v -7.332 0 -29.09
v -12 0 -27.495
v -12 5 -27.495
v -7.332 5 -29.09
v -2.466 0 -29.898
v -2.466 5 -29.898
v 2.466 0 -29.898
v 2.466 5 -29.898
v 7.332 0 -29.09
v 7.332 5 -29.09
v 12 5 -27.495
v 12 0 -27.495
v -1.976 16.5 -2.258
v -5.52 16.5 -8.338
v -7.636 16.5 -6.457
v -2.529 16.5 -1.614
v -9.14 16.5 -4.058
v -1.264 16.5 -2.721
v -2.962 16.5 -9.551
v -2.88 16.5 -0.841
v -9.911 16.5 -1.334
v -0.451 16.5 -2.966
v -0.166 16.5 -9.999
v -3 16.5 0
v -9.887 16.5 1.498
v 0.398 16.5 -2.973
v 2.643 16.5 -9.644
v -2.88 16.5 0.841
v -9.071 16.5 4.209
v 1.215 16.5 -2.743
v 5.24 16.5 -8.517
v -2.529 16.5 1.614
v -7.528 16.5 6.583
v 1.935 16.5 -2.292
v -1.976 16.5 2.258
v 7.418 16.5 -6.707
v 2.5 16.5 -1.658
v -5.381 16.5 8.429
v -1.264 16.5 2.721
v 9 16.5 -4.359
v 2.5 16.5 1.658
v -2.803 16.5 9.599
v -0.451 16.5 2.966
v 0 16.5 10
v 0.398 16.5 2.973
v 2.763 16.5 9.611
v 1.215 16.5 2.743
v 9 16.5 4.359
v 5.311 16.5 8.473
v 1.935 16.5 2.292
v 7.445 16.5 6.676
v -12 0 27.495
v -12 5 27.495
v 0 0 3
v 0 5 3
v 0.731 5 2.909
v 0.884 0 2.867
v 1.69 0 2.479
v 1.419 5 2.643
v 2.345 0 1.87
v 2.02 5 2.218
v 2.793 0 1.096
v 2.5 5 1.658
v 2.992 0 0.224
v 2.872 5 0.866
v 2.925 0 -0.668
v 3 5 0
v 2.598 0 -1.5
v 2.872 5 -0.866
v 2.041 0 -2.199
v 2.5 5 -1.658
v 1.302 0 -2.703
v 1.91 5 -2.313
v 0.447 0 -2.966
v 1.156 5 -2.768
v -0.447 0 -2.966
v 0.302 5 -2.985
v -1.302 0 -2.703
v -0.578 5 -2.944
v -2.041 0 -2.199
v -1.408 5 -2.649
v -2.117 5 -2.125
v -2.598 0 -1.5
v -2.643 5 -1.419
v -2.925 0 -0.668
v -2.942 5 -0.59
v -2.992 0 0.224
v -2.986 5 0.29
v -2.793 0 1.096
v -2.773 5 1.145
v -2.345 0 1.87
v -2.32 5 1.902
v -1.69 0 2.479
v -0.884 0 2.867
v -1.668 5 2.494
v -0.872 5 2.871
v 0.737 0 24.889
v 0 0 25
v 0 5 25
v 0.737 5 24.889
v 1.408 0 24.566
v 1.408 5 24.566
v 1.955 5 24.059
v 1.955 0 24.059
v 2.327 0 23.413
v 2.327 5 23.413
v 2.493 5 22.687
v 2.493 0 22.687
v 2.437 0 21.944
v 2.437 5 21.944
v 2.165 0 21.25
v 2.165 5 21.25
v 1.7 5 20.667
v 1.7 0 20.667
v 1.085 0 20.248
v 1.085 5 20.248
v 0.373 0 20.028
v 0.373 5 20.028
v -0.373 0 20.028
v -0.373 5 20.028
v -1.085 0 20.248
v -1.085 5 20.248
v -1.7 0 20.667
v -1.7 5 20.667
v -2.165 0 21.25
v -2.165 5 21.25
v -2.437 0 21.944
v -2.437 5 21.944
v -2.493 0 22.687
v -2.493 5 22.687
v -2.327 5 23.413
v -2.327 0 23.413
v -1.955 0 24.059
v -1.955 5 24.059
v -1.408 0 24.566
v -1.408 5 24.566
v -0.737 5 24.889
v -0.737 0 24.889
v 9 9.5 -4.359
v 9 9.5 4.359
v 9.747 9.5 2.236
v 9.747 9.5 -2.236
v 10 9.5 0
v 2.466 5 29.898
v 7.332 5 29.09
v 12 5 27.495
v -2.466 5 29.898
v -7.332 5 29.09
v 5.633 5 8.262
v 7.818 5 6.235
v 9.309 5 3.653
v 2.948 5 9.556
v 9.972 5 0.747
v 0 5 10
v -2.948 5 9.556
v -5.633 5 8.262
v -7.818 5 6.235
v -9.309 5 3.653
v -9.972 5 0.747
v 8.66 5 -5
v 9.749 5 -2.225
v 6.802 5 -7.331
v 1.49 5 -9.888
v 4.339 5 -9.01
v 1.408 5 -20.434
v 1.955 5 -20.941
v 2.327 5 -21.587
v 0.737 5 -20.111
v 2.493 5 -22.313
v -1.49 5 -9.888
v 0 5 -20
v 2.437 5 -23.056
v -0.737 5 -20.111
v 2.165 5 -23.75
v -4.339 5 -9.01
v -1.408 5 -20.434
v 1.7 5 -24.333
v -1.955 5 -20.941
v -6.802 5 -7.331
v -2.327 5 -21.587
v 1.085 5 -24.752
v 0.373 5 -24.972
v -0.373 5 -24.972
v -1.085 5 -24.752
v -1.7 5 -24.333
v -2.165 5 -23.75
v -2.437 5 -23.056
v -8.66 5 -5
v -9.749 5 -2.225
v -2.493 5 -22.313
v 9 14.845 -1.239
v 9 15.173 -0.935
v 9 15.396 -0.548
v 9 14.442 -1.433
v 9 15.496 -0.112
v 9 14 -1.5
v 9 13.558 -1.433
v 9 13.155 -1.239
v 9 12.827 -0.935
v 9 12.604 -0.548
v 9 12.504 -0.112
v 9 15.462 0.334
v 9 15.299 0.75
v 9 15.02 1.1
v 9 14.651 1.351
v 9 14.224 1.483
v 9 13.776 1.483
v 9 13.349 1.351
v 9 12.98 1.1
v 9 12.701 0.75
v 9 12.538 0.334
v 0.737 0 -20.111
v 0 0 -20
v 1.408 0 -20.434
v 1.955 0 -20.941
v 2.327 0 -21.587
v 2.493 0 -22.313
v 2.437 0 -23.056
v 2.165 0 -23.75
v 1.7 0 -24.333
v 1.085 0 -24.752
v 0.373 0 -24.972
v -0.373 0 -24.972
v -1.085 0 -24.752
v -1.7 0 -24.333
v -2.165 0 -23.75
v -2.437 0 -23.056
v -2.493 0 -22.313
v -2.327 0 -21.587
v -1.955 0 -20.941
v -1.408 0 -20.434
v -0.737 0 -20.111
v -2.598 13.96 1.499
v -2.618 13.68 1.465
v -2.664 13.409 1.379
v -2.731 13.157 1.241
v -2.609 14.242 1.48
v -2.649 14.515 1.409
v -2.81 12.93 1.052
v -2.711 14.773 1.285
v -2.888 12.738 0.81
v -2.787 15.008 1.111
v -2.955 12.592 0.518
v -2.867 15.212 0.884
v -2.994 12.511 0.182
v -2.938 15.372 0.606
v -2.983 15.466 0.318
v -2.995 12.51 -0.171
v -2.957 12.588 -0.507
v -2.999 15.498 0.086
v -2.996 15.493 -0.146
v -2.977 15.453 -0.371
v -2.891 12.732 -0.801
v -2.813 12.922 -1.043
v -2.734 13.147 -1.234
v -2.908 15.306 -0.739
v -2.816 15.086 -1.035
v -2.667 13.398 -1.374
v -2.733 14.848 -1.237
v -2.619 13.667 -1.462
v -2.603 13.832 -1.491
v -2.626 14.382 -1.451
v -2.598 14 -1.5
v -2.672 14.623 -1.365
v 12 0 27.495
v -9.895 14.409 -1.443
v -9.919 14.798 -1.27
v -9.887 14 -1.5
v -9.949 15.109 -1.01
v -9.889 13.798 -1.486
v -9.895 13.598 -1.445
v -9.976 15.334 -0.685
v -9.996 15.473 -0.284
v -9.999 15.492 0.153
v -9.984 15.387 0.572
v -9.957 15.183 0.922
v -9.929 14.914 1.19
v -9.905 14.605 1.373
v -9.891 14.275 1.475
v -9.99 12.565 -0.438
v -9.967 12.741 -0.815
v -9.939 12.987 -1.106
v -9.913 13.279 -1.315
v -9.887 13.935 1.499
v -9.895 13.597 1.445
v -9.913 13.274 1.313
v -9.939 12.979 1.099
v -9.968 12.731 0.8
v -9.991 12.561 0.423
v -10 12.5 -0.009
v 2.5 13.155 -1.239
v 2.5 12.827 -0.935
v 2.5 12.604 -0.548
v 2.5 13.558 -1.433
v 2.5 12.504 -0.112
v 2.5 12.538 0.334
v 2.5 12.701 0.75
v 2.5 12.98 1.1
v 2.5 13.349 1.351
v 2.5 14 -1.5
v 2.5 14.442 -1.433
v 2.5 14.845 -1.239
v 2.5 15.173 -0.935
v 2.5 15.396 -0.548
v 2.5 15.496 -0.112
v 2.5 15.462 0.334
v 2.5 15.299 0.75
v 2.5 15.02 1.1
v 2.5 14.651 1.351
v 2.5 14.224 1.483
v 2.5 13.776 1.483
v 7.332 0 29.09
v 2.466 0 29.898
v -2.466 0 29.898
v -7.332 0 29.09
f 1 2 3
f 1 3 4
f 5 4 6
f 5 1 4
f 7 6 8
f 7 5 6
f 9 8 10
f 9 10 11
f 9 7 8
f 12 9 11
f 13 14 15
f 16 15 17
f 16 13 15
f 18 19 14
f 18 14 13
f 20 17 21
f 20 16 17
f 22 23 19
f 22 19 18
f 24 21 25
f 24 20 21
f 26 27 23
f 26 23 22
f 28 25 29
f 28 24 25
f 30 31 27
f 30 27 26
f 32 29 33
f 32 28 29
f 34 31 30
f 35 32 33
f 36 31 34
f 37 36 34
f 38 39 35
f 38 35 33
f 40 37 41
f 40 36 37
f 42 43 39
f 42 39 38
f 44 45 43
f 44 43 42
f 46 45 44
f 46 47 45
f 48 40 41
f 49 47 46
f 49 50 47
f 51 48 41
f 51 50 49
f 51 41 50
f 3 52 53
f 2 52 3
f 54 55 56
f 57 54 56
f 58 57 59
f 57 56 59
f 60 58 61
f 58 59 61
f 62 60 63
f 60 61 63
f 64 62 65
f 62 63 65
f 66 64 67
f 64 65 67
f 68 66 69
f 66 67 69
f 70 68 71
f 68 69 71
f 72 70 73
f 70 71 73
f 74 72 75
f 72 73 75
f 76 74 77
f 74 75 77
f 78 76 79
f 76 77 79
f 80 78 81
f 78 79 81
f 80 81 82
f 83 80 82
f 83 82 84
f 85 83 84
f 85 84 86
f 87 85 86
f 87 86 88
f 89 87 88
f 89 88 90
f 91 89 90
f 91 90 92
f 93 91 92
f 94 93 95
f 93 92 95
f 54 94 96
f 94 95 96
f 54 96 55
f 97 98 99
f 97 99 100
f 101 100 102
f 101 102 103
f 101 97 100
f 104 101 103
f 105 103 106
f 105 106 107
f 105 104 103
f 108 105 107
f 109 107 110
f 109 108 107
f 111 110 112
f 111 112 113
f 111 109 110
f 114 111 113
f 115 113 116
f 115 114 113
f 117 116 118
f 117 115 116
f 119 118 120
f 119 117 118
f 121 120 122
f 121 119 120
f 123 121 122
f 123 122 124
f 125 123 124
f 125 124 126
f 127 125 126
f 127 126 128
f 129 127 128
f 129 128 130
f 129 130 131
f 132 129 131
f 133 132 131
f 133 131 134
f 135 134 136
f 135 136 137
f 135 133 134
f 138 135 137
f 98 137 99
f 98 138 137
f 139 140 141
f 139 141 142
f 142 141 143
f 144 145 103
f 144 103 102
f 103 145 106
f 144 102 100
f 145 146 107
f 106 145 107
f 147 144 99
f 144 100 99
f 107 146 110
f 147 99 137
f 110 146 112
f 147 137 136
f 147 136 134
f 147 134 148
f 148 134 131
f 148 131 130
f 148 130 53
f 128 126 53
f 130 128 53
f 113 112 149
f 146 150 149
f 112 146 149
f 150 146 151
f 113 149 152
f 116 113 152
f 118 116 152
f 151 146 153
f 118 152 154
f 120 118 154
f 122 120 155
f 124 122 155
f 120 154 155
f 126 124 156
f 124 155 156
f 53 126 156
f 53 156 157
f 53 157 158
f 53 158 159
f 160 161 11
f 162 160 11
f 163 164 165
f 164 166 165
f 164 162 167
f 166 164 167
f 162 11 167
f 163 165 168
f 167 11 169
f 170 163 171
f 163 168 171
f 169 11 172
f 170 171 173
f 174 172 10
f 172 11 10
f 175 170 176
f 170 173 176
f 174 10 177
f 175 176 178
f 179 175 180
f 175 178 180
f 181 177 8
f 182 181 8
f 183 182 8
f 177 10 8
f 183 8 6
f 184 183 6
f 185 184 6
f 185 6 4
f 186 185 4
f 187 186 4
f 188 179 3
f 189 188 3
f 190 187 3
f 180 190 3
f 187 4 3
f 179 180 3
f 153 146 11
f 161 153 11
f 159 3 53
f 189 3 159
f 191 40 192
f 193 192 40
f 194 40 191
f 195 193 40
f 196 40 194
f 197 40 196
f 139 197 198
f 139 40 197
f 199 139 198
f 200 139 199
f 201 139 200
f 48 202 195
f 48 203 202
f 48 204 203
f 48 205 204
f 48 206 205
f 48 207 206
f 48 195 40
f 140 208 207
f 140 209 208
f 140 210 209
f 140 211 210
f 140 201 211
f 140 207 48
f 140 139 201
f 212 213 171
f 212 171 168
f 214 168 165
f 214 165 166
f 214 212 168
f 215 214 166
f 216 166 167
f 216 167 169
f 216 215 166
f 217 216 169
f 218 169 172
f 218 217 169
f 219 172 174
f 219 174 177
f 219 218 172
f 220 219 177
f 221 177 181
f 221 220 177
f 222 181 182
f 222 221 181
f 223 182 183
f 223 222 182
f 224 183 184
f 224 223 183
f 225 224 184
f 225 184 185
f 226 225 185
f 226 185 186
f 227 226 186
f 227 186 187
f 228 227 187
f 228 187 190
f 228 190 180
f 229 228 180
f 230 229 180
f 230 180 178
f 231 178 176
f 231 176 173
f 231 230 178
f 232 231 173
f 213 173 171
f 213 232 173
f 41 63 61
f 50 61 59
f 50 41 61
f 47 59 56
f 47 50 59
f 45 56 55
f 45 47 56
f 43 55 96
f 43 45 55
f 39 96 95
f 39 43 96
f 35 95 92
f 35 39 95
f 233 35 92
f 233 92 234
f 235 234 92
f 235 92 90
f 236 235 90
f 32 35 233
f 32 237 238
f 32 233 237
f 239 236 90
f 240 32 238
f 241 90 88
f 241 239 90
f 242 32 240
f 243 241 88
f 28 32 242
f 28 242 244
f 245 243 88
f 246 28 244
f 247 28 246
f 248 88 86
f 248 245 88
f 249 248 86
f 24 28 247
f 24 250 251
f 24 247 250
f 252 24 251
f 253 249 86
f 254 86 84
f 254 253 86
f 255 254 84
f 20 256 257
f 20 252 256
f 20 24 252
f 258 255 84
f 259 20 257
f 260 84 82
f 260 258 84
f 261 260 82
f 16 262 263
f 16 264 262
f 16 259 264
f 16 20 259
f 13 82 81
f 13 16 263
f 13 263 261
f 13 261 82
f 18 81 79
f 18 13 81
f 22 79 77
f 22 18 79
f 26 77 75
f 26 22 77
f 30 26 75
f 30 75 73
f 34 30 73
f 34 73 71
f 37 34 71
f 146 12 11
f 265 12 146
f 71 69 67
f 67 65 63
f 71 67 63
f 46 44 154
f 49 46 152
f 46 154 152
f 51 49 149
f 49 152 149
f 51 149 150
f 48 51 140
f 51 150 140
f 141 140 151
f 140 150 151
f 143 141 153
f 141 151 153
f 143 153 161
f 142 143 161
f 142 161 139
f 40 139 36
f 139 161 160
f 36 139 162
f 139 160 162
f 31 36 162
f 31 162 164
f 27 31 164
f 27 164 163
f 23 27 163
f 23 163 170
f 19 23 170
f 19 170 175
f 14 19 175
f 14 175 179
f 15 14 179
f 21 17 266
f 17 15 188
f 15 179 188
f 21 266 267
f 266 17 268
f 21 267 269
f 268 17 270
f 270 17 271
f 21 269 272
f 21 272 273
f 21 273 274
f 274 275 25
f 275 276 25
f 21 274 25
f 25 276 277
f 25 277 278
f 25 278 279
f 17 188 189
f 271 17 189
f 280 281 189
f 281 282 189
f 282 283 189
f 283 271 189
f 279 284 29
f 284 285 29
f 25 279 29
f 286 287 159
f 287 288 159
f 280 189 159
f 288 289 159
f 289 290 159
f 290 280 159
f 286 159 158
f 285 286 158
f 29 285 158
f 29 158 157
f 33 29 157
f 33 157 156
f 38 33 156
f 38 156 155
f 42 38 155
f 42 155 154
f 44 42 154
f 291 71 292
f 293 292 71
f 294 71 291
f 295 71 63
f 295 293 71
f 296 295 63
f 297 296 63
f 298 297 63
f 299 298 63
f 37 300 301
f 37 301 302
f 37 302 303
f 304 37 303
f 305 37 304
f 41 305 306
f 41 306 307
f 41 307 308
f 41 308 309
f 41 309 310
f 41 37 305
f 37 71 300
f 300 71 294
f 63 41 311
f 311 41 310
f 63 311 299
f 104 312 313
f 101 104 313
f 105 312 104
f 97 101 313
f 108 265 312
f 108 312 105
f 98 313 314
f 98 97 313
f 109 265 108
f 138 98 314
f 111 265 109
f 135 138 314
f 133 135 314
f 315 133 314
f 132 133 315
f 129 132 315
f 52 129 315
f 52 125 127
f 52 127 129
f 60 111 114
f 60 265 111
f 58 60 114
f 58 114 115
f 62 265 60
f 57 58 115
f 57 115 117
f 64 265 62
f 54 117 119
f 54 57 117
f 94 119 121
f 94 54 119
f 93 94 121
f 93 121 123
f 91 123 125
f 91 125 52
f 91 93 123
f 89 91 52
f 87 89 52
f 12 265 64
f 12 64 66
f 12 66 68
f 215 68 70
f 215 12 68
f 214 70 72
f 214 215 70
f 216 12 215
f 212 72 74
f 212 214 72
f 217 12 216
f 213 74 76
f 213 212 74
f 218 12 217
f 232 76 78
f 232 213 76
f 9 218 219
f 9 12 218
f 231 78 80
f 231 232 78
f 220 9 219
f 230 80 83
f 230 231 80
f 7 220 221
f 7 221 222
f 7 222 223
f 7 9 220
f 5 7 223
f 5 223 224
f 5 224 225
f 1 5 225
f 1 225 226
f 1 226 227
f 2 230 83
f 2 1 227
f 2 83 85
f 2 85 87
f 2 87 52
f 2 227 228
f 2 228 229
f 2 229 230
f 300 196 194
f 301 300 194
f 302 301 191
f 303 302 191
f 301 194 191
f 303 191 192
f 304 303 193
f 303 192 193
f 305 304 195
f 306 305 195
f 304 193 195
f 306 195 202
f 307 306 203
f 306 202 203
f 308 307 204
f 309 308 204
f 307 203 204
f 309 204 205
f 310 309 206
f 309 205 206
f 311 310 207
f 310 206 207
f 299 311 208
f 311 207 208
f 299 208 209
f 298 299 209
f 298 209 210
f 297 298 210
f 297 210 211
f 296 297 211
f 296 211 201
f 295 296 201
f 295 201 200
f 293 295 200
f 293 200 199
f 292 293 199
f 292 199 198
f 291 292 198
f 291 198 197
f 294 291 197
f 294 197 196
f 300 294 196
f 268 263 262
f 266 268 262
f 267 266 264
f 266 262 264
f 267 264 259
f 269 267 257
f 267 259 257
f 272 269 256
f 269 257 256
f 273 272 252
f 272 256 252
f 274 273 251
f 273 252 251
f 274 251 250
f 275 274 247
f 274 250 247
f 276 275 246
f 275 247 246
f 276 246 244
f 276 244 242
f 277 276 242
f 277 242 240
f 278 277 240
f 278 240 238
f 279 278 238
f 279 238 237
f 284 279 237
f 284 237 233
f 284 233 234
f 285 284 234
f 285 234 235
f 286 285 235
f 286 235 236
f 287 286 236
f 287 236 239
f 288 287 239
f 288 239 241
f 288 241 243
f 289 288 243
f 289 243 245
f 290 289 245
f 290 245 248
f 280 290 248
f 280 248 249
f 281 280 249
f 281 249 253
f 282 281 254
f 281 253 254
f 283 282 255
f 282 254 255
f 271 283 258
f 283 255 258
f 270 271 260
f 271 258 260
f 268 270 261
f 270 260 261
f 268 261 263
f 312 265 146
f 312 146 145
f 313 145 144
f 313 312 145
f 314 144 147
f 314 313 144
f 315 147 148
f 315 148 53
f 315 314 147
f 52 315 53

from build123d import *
from build123d.topology import SkipClean

# Parameters (mm, degrees)
SKETCH_1_R          = 2.5
EXTRUDE_1_DEPTH     = 5
SKETCH_2_R          = 10
EXTRUDE_2_DEPTH     = 11.5
CUT_EXTRUDE_START   = -7
CUT_EXTRUDE_1_DEPTH = 7
CUT_EXTRUDE_2_DEPTH = 11.5
SKETCH_5_R          = 3
CUT_EXTRUDE_3_DEPTH = 11.5
SKETCH_6_R          = 1.5
CUT_EXTRUDE_4_DEPTH = 41.165283517


with BuildPart() as part:
    # 草图1 → 凸台-拉伸1 (new body)
    with BuildSketch(Plane(origin=(0, 0, 0), x_dir=(1, 0, 0), z_dir=(0, 1, 0))):
        with BuildLine():
            Line((12, 27.49545417), (12, -27.49545417))
            ThreePointArc((12, -27.49545417), (0, -30), (-12, -27.49545417))
            Line((-12, -27.49545417), (-12, 27.49545417))
            ThreePointArc((-12, 27.49545417), (0, 30), (12, 27.49545417))
        make_face()
        with Locations(Location((0, 22.5, 0), (0, 0, 270))):
            Circle(SKETCH_1_R, mode=Mode.SUBTRACT)
        with Locations(Location((0, -22.5, 0), (0, 0, 270))):
            Circle(SKETCH_1_R, mode=Mode.SUBTRACT)
    extrude(amount=EXTRUDE_1_DEPTH)

    # 草图2 → 凸台-拉伸2 (add)
    with BuildSketch(Plane(origin=(0, 5, 0), x_dir=(1, 0, 0), z_dir=(0, 1, 0))):
        with Locations(Location((0, 0, 0), (0, 0, 270))):
            Circle(SKETCH_2_R)
    extrude(amount=EXTRUDE_2_DEPTH)

    # 草图3 → 切除-拉伸1 (cut)
    with BuildSketch(Plane(origin=(0, 16.5, 0), x_dir=(1, 0, 0), z_dir=(0, 1, 0)).offset(CUT_EXTRUDE_START)):
        with BuildLine():
            Line((9, 4.358898944), (9, -4.358898944))
            ThreePointArc((9, -4.358898944), (10, 0), (9, 4.358898944))
        make_face()
    extrude(amount=CUT_EXTRUDE_1_DEPTH, mode=Mode.SUBTRACT)

    # 草图4 → 切除-拉伸2 (cut)
    with BuildSketch(Plane(origin=(0, 16.5, 0), x_dir=(1, 0, 0), z_dir=(0, 1, 0))):
        with BuildLine():
            Line((2.5, 1.658312395), (2.5, -1.658312395))
            ThreePointArc((2.5, -1.658312395), (-3, 0), (2.5, 1.658312395))
        make_face()
    extrude(amount=-CUT_EXTRUDE_2_DEPTH, mode=Mode.SUBTRACT)

    # 草图5 → 切除-拉伸3 (cut)
    with SkipClean():  # the faces are left unmerged after this step: merging them gives an invalid solid
        with BuildSketch(Plane(origin=(0, 5, 0), x_dir=(1, 0, 0), z_dir=(0, 1, 0))):
            with Locations(Location((0, 0, 0), (0, 0, 270))):
                Circle(SKETCH_5_R)
        extrude(amount=-CUT_EXTRUDE_3_DEPTH, mode=Mode.SUBTRACT)

    # 草图6 → 切除-拉伸4 (cut, through all)
    with SkipClean():  # the faces are left unmerged after this step: merging them gives an invalid solid
        with BuildSketch(Plane(origin=(9, 0, 0), x_dir=(0, 0, -1), z_dir=(1, 0, 0))):
            with Locations((0, 14)):
                Circle(SKETCH_6_R)
        extrude(amount=-CUT_EXTRUDE_4_DEPTH, mode=Mode.SUBTRACT)


solid = part.part
